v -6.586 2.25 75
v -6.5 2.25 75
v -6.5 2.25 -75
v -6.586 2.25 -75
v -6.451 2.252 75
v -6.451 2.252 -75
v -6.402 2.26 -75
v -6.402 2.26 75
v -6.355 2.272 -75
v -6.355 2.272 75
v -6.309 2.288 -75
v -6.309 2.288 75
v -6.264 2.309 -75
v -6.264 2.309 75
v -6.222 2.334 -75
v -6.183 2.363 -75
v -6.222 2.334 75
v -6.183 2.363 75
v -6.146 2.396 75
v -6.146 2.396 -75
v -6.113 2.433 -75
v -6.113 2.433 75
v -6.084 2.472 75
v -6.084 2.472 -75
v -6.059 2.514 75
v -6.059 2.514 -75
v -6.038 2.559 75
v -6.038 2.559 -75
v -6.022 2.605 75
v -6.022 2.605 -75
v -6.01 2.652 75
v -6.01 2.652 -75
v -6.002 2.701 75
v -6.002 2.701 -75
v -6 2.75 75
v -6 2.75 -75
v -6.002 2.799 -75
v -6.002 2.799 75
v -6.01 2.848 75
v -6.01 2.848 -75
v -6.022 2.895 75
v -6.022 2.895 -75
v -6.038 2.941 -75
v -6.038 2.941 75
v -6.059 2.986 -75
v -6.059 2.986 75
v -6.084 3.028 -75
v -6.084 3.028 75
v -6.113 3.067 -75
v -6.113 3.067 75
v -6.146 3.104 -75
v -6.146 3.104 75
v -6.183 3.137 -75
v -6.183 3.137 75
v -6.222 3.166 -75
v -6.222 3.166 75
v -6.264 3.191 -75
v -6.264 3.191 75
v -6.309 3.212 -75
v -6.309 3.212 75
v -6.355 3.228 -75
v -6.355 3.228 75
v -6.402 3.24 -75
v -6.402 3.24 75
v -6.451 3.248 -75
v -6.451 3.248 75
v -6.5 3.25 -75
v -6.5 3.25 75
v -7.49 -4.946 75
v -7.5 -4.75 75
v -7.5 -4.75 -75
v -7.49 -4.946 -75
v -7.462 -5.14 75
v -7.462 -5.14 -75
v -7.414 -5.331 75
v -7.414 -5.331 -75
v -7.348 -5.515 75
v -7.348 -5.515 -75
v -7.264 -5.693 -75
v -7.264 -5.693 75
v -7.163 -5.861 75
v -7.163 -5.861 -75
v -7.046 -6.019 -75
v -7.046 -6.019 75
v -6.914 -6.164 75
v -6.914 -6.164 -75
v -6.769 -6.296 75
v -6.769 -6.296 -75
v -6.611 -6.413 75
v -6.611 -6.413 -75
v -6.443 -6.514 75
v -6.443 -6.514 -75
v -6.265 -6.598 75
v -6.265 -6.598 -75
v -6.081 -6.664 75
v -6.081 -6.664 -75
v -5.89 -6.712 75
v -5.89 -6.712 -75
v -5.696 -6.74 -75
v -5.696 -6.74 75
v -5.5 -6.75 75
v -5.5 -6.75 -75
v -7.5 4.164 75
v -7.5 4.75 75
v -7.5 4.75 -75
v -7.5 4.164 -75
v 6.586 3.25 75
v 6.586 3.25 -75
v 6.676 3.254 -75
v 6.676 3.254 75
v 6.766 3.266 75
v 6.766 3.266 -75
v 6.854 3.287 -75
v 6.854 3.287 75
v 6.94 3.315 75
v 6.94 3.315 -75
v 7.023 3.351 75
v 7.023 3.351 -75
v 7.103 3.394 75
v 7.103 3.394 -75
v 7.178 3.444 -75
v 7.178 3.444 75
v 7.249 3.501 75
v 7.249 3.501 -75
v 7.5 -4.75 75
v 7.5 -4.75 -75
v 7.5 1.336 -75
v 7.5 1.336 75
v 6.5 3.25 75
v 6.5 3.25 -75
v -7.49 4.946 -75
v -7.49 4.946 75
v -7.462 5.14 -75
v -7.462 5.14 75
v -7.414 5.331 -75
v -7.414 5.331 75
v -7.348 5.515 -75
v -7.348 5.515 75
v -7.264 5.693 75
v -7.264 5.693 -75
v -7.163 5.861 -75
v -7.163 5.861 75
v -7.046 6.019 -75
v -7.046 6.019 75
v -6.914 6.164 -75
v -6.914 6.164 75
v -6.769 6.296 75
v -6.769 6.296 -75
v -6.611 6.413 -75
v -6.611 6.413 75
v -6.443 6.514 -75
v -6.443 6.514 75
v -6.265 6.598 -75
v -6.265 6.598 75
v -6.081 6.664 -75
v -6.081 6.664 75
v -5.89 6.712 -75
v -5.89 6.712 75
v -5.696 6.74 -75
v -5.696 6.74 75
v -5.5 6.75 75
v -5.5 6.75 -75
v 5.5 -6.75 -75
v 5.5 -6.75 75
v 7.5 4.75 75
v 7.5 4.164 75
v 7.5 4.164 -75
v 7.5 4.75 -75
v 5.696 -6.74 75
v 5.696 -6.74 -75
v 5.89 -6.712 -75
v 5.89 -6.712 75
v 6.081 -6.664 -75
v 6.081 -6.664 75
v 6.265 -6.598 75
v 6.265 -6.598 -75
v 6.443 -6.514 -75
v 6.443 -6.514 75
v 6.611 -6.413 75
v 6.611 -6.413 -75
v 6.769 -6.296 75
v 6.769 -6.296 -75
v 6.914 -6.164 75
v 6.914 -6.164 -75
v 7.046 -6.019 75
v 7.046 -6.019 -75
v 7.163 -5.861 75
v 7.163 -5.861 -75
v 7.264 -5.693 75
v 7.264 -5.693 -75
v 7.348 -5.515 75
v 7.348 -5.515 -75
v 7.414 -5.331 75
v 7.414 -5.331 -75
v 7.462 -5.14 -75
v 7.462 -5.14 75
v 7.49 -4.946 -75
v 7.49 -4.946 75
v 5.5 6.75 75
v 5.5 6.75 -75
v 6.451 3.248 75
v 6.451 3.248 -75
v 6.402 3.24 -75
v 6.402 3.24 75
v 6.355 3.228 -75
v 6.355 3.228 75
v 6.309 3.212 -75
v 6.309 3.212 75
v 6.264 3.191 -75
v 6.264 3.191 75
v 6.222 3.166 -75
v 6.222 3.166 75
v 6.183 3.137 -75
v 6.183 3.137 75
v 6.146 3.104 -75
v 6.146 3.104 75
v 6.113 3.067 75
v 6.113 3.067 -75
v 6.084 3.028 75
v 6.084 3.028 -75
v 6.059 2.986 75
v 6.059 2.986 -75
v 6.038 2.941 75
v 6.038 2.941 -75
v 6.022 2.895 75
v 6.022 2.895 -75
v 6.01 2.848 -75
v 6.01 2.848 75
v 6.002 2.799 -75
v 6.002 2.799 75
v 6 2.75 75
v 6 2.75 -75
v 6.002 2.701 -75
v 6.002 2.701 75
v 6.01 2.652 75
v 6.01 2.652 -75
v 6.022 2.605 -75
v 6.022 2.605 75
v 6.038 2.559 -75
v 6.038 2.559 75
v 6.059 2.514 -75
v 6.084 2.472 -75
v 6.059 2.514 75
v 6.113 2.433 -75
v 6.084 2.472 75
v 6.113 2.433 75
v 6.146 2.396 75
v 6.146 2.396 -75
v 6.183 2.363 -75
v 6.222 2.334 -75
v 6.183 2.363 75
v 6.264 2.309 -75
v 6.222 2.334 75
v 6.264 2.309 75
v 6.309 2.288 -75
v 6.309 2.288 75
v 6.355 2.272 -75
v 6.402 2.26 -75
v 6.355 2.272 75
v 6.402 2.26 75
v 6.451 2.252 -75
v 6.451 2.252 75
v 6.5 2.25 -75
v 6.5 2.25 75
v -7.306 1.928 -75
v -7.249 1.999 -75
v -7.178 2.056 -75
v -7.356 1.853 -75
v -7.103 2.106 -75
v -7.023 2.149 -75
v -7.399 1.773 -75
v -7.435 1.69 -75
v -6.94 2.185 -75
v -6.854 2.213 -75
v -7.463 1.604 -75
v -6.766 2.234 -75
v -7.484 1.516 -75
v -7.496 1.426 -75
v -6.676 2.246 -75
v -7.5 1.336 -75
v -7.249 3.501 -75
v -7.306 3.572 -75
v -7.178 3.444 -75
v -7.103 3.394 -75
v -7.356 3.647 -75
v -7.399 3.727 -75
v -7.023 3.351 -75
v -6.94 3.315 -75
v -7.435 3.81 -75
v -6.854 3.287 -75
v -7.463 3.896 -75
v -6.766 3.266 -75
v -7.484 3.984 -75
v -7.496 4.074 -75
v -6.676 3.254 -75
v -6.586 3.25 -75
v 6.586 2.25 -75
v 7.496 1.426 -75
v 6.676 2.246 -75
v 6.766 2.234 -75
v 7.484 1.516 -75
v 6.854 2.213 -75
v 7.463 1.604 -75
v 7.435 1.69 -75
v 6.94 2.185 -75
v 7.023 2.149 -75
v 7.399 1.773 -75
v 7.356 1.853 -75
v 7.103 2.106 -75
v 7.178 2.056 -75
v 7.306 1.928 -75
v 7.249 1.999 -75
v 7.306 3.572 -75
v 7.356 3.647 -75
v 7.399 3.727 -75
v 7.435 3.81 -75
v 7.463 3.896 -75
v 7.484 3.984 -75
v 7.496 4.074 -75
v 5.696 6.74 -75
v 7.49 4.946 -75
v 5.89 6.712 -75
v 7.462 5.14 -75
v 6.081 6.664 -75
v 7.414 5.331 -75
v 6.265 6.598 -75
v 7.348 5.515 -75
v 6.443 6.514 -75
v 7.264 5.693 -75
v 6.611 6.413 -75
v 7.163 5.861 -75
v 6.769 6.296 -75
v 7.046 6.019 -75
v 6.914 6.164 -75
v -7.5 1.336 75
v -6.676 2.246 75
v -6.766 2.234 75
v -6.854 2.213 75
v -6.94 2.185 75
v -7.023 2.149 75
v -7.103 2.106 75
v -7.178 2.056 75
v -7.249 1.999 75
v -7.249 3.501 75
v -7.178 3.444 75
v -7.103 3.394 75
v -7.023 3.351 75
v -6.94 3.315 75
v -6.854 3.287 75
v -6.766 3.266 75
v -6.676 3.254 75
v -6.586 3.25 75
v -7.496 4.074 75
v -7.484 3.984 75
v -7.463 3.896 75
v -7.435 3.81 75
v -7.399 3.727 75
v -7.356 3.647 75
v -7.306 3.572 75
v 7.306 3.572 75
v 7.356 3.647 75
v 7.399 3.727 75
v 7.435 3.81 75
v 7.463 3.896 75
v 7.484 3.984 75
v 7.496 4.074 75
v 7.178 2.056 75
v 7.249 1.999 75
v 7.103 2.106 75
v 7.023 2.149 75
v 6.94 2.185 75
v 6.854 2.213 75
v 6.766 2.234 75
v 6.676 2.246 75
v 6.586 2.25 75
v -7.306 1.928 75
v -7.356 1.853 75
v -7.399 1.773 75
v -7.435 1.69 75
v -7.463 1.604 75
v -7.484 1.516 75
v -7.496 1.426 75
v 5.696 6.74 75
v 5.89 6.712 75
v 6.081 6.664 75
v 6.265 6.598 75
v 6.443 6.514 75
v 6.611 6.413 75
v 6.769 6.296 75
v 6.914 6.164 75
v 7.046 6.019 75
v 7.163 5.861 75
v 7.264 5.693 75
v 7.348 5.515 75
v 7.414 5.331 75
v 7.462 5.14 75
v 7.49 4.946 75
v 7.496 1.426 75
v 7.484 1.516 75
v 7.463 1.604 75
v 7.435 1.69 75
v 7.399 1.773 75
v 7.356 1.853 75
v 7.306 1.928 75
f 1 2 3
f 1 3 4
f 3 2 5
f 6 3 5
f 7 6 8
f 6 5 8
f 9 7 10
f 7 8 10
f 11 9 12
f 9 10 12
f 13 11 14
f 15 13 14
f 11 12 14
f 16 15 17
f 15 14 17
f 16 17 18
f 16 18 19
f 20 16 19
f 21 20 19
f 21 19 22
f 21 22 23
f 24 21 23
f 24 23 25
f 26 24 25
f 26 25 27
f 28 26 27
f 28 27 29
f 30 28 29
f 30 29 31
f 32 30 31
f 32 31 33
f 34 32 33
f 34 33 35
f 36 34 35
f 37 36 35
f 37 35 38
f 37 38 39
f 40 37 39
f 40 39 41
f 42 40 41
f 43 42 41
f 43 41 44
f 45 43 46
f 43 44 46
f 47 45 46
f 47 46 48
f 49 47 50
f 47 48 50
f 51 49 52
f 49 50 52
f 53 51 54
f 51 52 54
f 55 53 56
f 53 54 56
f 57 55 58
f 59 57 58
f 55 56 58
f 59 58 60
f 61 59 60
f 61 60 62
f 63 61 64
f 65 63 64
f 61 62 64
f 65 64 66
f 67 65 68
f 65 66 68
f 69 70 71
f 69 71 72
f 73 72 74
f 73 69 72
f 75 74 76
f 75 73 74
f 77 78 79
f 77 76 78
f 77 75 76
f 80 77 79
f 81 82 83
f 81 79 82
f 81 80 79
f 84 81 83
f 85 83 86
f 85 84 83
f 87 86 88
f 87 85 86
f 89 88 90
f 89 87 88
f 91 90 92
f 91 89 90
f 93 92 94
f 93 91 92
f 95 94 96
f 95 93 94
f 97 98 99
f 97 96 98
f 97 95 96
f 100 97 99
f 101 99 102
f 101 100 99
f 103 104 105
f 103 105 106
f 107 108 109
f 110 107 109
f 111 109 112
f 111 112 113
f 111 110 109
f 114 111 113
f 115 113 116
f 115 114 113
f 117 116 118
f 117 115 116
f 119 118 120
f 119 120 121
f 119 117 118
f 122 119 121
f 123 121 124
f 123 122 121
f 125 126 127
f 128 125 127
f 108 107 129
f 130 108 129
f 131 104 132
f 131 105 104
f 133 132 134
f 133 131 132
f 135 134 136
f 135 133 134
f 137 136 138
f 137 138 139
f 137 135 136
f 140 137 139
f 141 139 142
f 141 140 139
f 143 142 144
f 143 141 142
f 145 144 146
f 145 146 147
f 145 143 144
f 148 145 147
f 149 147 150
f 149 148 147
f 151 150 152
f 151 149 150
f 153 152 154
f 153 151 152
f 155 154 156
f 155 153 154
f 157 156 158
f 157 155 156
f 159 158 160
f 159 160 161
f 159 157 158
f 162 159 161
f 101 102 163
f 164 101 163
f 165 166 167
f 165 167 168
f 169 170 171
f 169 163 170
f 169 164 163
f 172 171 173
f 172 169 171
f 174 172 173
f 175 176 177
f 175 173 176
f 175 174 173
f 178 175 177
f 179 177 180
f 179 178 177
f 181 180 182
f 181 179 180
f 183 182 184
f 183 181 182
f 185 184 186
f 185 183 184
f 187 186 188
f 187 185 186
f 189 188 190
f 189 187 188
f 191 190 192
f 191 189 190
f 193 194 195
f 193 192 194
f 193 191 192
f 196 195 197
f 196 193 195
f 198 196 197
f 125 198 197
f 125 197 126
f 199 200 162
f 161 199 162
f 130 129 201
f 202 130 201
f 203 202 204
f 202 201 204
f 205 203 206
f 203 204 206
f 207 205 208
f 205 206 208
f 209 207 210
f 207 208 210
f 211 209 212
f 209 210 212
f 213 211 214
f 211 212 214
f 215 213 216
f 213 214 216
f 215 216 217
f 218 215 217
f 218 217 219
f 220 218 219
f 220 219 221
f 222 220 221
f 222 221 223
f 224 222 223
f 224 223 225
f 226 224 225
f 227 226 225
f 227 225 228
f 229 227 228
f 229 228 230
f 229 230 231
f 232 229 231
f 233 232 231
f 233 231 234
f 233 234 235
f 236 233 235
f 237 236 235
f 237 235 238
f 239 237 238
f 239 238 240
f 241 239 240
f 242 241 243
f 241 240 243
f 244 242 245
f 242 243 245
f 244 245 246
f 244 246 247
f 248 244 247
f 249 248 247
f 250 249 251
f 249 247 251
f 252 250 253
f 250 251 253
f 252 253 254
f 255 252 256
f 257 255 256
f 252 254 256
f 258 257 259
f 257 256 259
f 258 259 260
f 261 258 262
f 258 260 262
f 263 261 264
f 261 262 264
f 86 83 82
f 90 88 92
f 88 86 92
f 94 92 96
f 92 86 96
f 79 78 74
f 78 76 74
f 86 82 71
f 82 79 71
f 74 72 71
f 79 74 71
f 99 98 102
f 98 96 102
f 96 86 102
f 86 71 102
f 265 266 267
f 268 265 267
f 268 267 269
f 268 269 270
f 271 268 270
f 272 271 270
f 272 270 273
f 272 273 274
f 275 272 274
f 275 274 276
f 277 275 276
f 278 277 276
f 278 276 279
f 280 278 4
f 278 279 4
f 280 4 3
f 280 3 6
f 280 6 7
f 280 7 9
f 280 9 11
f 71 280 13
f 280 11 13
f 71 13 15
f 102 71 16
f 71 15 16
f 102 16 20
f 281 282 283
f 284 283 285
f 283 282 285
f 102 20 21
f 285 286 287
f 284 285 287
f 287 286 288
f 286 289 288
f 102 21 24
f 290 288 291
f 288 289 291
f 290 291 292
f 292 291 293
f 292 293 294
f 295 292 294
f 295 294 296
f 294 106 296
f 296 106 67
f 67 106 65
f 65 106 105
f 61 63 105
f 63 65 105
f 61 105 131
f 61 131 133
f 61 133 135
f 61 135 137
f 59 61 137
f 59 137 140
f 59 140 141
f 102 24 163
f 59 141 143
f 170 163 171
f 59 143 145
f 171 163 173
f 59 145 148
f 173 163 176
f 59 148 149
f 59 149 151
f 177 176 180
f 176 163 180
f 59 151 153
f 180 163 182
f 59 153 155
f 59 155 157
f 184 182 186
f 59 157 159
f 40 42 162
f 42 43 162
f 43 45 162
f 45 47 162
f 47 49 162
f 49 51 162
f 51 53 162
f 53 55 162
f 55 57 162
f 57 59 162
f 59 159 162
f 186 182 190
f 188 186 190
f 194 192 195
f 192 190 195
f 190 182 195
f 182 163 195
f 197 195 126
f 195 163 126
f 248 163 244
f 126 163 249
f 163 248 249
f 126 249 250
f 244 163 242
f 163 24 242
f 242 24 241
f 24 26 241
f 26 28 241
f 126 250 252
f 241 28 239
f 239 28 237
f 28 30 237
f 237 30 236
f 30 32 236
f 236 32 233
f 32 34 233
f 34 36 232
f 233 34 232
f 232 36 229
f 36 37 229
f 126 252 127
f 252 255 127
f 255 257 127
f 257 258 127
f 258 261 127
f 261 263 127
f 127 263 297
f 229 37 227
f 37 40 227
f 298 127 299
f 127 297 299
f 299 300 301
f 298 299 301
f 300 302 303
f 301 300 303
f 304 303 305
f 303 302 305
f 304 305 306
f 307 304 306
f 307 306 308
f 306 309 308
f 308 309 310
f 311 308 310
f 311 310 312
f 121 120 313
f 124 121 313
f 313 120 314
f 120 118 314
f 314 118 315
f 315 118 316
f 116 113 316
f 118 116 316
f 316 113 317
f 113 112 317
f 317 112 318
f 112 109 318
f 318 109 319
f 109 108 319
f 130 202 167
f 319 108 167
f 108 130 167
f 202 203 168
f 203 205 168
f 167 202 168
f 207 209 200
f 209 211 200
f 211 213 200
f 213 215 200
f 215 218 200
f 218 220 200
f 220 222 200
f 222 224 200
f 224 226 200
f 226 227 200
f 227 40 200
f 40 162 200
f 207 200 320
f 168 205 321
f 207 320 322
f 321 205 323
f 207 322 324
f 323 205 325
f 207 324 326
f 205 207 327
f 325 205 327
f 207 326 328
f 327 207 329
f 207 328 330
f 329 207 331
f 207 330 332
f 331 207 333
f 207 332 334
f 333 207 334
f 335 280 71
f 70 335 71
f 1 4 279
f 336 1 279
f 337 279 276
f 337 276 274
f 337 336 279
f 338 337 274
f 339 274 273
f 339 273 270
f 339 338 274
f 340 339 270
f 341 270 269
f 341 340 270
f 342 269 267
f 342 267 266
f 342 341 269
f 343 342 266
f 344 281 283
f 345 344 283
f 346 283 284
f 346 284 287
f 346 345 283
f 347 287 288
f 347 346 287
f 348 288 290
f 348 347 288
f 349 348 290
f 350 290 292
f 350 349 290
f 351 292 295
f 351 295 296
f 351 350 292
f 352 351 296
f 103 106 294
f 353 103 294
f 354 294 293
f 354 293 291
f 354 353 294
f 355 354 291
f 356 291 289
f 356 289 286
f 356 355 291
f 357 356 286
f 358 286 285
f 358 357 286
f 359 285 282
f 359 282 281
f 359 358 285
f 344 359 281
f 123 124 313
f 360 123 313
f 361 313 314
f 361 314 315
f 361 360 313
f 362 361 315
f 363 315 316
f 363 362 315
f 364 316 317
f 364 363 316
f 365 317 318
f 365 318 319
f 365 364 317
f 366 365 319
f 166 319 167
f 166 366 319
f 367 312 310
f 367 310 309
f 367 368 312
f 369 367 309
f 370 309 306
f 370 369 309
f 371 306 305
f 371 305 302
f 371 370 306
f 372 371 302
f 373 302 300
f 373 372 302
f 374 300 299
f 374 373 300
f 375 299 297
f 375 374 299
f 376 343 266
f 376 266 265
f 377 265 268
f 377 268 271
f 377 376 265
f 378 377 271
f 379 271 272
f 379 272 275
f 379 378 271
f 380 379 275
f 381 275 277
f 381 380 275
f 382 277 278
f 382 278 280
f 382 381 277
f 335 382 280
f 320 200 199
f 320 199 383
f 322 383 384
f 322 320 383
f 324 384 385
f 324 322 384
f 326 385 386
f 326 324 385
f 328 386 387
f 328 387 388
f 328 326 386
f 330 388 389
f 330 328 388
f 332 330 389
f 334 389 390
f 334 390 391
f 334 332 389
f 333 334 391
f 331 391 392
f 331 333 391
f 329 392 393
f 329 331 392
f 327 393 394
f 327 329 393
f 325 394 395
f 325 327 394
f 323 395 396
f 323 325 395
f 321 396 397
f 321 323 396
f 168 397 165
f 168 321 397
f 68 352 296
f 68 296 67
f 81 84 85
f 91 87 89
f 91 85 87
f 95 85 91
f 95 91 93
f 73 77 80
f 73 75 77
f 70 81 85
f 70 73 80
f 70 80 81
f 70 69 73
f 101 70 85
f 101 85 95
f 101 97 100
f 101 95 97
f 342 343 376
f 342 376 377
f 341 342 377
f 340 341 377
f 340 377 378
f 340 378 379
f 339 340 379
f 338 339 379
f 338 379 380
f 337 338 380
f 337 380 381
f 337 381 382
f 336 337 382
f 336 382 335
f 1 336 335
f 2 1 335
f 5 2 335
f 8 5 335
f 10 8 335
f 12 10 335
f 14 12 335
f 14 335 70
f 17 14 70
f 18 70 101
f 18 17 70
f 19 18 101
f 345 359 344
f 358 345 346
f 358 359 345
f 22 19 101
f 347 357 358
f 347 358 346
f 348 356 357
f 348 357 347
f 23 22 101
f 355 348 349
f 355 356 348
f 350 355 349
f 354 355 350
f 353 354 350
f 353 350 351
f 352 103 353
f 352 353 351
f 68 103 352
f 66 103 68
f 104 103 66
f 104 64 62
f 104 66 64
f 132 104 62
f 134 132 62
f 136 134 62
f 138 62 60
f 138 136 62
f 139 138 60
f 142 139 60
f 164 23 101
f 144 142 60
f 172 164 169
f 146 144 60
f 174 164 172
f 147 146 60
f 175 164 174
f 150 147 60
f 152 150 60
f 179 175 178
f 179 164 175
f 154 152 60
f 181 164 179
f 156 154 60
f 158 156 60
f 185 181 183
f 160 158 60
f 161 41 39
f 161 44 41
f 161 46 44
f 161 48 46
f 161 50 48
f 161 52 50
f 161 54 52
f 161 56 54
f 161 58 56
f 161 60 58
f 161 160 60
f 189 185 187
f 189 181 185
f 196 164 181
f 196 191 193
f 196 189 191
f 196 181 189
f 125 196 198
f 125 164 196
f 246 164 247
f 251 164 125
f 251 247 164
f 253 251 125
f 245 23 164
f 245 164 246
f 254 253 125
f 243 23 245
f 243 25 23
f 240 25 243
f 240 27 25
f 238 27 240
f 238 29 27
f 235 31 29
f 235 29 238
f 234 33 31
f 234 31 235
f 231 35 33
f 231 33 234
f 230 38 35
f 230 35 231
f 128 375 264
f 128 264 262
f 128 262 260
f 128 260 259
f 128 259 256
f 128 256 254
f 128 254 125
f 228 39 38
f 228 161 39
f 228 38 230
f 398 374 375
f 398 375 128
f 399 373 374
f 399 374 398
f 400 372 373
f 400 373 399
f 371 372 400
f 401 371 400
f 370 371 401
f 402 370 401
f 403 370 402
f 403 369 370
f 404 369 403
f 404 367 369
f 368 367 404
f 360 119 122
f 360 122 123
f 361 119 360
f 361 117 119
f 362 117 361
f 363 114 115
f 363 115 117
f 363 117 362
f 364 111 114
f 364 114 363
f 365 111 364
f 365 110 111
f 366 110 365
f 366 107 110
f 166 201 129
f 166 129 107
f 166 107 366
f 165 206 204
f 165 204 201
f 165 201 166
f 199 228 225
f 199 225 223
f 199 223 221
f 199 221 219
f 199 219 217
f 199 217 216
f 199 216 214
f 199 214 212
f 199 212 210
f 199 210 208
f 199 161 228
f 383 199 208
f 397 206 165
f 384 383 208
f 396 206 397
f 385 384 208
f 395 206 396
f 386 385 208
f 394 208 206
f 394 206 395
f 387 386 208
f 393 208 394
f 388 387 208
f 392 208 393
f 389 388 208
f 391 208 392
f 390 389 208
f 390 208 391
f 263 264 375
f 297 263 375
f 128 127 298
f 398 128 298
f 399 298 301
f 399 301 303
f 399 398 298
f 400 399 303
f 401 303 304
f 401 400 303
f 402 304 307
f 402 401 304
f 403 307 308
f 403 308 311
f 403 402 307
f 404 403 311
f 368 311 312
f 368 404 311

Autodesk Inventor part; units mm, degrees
ref_plane "YZ Plane" through (0, 0, 0) normal (1, 0, 0) x (0, 1, 0)
ref_plane "XZ Plane" through (0, 0, 0) normal (0, 1, 0) x (-1, 0, 0)
ref_plane "XY Plane" through (0, 0, 0) normal (0, 0, 1) x (1, 0, 0)
sketch "Sketch1" plane through (0, 0, 0) normal (0, 0, 1) x (1, 0, 0)
  line L0 (-7.5, -6.75) -> (7.5, -6.75)
  line L1 (7.5, -6.75) -> (7.5, 6.75)
  line L2 (7.5, 6.75) -> (-7.5, 6.75)
  line L3 (-7.5, 6.75) -> (-7.5, -6.75)
  line L4 (-7.5, -6.75) -> (7.5, 6.75) construction
  line L5 (7.5, -6.75) -> (-7.5, 6.75) construction
  point P0 (0, 0)
  dimension "d0" = 15
  dimension "d1" = 13.5
extrude "Extrusion1" add sketch "Sketch1" along normal mid plane 150
sketch "Sketch2" plane through (0, 0, 75) normal (0, 0, 1) x (1, 0, 0)
  line L0 (7.5, 6.75) -> (-7.5, 6.75) projected
  line L1 (-7.5, 6.75) -> (-7.5, -6.75) projected
  line L2 (-7.5, 3.75) -> (-7, 3.25)
  line L3 (-7, 3.25) -> (-6.5, 3.25)
  line L4 (-6.5, 2.25) -> (-7, 2.25)
  line L5 (-7, 2.25) -> (-7.5, 1.75)
  arc A0 (-6.5, 2.25) -> (-6.5, 3.25) centre (-6.5, 2.75) ccw
  line L6 (-7.5, 1.75) -> (-7.5, 3.75)
  point P0 (0, 0)
  dimension "d4" = 4
  dimension "d5" = 1
  dimension "d6" = 0.5
  dimension "d7" = 0.5
  dimension "d8" = 2
extrude "Extrusion2" cut sketch "Sketch2" against normal up to next
mirror "Mirror1" about plane through (0, 0, 0) normal (1, 0, 0) of "Extrusion2"
fillet "Fillet1" radius 2 4 edges at (7.5, 6.75, 0) (-7.5, 6.75, 0) (7.5, -6.75, 0) (-7.5, -6.75, 0)
fillet "Fillet2" radius 1 8 edges at (-7, 2.25, 0) (-7.5, 1.75, 0) (-7, 3.25, 0) (-7.5, 3.75, 0) (7, 2.25, 0) (7.5, 1.75, 0) (7.5, 3.75, 0) (7, 3.25, 0)
properties part number "Rail-06"
